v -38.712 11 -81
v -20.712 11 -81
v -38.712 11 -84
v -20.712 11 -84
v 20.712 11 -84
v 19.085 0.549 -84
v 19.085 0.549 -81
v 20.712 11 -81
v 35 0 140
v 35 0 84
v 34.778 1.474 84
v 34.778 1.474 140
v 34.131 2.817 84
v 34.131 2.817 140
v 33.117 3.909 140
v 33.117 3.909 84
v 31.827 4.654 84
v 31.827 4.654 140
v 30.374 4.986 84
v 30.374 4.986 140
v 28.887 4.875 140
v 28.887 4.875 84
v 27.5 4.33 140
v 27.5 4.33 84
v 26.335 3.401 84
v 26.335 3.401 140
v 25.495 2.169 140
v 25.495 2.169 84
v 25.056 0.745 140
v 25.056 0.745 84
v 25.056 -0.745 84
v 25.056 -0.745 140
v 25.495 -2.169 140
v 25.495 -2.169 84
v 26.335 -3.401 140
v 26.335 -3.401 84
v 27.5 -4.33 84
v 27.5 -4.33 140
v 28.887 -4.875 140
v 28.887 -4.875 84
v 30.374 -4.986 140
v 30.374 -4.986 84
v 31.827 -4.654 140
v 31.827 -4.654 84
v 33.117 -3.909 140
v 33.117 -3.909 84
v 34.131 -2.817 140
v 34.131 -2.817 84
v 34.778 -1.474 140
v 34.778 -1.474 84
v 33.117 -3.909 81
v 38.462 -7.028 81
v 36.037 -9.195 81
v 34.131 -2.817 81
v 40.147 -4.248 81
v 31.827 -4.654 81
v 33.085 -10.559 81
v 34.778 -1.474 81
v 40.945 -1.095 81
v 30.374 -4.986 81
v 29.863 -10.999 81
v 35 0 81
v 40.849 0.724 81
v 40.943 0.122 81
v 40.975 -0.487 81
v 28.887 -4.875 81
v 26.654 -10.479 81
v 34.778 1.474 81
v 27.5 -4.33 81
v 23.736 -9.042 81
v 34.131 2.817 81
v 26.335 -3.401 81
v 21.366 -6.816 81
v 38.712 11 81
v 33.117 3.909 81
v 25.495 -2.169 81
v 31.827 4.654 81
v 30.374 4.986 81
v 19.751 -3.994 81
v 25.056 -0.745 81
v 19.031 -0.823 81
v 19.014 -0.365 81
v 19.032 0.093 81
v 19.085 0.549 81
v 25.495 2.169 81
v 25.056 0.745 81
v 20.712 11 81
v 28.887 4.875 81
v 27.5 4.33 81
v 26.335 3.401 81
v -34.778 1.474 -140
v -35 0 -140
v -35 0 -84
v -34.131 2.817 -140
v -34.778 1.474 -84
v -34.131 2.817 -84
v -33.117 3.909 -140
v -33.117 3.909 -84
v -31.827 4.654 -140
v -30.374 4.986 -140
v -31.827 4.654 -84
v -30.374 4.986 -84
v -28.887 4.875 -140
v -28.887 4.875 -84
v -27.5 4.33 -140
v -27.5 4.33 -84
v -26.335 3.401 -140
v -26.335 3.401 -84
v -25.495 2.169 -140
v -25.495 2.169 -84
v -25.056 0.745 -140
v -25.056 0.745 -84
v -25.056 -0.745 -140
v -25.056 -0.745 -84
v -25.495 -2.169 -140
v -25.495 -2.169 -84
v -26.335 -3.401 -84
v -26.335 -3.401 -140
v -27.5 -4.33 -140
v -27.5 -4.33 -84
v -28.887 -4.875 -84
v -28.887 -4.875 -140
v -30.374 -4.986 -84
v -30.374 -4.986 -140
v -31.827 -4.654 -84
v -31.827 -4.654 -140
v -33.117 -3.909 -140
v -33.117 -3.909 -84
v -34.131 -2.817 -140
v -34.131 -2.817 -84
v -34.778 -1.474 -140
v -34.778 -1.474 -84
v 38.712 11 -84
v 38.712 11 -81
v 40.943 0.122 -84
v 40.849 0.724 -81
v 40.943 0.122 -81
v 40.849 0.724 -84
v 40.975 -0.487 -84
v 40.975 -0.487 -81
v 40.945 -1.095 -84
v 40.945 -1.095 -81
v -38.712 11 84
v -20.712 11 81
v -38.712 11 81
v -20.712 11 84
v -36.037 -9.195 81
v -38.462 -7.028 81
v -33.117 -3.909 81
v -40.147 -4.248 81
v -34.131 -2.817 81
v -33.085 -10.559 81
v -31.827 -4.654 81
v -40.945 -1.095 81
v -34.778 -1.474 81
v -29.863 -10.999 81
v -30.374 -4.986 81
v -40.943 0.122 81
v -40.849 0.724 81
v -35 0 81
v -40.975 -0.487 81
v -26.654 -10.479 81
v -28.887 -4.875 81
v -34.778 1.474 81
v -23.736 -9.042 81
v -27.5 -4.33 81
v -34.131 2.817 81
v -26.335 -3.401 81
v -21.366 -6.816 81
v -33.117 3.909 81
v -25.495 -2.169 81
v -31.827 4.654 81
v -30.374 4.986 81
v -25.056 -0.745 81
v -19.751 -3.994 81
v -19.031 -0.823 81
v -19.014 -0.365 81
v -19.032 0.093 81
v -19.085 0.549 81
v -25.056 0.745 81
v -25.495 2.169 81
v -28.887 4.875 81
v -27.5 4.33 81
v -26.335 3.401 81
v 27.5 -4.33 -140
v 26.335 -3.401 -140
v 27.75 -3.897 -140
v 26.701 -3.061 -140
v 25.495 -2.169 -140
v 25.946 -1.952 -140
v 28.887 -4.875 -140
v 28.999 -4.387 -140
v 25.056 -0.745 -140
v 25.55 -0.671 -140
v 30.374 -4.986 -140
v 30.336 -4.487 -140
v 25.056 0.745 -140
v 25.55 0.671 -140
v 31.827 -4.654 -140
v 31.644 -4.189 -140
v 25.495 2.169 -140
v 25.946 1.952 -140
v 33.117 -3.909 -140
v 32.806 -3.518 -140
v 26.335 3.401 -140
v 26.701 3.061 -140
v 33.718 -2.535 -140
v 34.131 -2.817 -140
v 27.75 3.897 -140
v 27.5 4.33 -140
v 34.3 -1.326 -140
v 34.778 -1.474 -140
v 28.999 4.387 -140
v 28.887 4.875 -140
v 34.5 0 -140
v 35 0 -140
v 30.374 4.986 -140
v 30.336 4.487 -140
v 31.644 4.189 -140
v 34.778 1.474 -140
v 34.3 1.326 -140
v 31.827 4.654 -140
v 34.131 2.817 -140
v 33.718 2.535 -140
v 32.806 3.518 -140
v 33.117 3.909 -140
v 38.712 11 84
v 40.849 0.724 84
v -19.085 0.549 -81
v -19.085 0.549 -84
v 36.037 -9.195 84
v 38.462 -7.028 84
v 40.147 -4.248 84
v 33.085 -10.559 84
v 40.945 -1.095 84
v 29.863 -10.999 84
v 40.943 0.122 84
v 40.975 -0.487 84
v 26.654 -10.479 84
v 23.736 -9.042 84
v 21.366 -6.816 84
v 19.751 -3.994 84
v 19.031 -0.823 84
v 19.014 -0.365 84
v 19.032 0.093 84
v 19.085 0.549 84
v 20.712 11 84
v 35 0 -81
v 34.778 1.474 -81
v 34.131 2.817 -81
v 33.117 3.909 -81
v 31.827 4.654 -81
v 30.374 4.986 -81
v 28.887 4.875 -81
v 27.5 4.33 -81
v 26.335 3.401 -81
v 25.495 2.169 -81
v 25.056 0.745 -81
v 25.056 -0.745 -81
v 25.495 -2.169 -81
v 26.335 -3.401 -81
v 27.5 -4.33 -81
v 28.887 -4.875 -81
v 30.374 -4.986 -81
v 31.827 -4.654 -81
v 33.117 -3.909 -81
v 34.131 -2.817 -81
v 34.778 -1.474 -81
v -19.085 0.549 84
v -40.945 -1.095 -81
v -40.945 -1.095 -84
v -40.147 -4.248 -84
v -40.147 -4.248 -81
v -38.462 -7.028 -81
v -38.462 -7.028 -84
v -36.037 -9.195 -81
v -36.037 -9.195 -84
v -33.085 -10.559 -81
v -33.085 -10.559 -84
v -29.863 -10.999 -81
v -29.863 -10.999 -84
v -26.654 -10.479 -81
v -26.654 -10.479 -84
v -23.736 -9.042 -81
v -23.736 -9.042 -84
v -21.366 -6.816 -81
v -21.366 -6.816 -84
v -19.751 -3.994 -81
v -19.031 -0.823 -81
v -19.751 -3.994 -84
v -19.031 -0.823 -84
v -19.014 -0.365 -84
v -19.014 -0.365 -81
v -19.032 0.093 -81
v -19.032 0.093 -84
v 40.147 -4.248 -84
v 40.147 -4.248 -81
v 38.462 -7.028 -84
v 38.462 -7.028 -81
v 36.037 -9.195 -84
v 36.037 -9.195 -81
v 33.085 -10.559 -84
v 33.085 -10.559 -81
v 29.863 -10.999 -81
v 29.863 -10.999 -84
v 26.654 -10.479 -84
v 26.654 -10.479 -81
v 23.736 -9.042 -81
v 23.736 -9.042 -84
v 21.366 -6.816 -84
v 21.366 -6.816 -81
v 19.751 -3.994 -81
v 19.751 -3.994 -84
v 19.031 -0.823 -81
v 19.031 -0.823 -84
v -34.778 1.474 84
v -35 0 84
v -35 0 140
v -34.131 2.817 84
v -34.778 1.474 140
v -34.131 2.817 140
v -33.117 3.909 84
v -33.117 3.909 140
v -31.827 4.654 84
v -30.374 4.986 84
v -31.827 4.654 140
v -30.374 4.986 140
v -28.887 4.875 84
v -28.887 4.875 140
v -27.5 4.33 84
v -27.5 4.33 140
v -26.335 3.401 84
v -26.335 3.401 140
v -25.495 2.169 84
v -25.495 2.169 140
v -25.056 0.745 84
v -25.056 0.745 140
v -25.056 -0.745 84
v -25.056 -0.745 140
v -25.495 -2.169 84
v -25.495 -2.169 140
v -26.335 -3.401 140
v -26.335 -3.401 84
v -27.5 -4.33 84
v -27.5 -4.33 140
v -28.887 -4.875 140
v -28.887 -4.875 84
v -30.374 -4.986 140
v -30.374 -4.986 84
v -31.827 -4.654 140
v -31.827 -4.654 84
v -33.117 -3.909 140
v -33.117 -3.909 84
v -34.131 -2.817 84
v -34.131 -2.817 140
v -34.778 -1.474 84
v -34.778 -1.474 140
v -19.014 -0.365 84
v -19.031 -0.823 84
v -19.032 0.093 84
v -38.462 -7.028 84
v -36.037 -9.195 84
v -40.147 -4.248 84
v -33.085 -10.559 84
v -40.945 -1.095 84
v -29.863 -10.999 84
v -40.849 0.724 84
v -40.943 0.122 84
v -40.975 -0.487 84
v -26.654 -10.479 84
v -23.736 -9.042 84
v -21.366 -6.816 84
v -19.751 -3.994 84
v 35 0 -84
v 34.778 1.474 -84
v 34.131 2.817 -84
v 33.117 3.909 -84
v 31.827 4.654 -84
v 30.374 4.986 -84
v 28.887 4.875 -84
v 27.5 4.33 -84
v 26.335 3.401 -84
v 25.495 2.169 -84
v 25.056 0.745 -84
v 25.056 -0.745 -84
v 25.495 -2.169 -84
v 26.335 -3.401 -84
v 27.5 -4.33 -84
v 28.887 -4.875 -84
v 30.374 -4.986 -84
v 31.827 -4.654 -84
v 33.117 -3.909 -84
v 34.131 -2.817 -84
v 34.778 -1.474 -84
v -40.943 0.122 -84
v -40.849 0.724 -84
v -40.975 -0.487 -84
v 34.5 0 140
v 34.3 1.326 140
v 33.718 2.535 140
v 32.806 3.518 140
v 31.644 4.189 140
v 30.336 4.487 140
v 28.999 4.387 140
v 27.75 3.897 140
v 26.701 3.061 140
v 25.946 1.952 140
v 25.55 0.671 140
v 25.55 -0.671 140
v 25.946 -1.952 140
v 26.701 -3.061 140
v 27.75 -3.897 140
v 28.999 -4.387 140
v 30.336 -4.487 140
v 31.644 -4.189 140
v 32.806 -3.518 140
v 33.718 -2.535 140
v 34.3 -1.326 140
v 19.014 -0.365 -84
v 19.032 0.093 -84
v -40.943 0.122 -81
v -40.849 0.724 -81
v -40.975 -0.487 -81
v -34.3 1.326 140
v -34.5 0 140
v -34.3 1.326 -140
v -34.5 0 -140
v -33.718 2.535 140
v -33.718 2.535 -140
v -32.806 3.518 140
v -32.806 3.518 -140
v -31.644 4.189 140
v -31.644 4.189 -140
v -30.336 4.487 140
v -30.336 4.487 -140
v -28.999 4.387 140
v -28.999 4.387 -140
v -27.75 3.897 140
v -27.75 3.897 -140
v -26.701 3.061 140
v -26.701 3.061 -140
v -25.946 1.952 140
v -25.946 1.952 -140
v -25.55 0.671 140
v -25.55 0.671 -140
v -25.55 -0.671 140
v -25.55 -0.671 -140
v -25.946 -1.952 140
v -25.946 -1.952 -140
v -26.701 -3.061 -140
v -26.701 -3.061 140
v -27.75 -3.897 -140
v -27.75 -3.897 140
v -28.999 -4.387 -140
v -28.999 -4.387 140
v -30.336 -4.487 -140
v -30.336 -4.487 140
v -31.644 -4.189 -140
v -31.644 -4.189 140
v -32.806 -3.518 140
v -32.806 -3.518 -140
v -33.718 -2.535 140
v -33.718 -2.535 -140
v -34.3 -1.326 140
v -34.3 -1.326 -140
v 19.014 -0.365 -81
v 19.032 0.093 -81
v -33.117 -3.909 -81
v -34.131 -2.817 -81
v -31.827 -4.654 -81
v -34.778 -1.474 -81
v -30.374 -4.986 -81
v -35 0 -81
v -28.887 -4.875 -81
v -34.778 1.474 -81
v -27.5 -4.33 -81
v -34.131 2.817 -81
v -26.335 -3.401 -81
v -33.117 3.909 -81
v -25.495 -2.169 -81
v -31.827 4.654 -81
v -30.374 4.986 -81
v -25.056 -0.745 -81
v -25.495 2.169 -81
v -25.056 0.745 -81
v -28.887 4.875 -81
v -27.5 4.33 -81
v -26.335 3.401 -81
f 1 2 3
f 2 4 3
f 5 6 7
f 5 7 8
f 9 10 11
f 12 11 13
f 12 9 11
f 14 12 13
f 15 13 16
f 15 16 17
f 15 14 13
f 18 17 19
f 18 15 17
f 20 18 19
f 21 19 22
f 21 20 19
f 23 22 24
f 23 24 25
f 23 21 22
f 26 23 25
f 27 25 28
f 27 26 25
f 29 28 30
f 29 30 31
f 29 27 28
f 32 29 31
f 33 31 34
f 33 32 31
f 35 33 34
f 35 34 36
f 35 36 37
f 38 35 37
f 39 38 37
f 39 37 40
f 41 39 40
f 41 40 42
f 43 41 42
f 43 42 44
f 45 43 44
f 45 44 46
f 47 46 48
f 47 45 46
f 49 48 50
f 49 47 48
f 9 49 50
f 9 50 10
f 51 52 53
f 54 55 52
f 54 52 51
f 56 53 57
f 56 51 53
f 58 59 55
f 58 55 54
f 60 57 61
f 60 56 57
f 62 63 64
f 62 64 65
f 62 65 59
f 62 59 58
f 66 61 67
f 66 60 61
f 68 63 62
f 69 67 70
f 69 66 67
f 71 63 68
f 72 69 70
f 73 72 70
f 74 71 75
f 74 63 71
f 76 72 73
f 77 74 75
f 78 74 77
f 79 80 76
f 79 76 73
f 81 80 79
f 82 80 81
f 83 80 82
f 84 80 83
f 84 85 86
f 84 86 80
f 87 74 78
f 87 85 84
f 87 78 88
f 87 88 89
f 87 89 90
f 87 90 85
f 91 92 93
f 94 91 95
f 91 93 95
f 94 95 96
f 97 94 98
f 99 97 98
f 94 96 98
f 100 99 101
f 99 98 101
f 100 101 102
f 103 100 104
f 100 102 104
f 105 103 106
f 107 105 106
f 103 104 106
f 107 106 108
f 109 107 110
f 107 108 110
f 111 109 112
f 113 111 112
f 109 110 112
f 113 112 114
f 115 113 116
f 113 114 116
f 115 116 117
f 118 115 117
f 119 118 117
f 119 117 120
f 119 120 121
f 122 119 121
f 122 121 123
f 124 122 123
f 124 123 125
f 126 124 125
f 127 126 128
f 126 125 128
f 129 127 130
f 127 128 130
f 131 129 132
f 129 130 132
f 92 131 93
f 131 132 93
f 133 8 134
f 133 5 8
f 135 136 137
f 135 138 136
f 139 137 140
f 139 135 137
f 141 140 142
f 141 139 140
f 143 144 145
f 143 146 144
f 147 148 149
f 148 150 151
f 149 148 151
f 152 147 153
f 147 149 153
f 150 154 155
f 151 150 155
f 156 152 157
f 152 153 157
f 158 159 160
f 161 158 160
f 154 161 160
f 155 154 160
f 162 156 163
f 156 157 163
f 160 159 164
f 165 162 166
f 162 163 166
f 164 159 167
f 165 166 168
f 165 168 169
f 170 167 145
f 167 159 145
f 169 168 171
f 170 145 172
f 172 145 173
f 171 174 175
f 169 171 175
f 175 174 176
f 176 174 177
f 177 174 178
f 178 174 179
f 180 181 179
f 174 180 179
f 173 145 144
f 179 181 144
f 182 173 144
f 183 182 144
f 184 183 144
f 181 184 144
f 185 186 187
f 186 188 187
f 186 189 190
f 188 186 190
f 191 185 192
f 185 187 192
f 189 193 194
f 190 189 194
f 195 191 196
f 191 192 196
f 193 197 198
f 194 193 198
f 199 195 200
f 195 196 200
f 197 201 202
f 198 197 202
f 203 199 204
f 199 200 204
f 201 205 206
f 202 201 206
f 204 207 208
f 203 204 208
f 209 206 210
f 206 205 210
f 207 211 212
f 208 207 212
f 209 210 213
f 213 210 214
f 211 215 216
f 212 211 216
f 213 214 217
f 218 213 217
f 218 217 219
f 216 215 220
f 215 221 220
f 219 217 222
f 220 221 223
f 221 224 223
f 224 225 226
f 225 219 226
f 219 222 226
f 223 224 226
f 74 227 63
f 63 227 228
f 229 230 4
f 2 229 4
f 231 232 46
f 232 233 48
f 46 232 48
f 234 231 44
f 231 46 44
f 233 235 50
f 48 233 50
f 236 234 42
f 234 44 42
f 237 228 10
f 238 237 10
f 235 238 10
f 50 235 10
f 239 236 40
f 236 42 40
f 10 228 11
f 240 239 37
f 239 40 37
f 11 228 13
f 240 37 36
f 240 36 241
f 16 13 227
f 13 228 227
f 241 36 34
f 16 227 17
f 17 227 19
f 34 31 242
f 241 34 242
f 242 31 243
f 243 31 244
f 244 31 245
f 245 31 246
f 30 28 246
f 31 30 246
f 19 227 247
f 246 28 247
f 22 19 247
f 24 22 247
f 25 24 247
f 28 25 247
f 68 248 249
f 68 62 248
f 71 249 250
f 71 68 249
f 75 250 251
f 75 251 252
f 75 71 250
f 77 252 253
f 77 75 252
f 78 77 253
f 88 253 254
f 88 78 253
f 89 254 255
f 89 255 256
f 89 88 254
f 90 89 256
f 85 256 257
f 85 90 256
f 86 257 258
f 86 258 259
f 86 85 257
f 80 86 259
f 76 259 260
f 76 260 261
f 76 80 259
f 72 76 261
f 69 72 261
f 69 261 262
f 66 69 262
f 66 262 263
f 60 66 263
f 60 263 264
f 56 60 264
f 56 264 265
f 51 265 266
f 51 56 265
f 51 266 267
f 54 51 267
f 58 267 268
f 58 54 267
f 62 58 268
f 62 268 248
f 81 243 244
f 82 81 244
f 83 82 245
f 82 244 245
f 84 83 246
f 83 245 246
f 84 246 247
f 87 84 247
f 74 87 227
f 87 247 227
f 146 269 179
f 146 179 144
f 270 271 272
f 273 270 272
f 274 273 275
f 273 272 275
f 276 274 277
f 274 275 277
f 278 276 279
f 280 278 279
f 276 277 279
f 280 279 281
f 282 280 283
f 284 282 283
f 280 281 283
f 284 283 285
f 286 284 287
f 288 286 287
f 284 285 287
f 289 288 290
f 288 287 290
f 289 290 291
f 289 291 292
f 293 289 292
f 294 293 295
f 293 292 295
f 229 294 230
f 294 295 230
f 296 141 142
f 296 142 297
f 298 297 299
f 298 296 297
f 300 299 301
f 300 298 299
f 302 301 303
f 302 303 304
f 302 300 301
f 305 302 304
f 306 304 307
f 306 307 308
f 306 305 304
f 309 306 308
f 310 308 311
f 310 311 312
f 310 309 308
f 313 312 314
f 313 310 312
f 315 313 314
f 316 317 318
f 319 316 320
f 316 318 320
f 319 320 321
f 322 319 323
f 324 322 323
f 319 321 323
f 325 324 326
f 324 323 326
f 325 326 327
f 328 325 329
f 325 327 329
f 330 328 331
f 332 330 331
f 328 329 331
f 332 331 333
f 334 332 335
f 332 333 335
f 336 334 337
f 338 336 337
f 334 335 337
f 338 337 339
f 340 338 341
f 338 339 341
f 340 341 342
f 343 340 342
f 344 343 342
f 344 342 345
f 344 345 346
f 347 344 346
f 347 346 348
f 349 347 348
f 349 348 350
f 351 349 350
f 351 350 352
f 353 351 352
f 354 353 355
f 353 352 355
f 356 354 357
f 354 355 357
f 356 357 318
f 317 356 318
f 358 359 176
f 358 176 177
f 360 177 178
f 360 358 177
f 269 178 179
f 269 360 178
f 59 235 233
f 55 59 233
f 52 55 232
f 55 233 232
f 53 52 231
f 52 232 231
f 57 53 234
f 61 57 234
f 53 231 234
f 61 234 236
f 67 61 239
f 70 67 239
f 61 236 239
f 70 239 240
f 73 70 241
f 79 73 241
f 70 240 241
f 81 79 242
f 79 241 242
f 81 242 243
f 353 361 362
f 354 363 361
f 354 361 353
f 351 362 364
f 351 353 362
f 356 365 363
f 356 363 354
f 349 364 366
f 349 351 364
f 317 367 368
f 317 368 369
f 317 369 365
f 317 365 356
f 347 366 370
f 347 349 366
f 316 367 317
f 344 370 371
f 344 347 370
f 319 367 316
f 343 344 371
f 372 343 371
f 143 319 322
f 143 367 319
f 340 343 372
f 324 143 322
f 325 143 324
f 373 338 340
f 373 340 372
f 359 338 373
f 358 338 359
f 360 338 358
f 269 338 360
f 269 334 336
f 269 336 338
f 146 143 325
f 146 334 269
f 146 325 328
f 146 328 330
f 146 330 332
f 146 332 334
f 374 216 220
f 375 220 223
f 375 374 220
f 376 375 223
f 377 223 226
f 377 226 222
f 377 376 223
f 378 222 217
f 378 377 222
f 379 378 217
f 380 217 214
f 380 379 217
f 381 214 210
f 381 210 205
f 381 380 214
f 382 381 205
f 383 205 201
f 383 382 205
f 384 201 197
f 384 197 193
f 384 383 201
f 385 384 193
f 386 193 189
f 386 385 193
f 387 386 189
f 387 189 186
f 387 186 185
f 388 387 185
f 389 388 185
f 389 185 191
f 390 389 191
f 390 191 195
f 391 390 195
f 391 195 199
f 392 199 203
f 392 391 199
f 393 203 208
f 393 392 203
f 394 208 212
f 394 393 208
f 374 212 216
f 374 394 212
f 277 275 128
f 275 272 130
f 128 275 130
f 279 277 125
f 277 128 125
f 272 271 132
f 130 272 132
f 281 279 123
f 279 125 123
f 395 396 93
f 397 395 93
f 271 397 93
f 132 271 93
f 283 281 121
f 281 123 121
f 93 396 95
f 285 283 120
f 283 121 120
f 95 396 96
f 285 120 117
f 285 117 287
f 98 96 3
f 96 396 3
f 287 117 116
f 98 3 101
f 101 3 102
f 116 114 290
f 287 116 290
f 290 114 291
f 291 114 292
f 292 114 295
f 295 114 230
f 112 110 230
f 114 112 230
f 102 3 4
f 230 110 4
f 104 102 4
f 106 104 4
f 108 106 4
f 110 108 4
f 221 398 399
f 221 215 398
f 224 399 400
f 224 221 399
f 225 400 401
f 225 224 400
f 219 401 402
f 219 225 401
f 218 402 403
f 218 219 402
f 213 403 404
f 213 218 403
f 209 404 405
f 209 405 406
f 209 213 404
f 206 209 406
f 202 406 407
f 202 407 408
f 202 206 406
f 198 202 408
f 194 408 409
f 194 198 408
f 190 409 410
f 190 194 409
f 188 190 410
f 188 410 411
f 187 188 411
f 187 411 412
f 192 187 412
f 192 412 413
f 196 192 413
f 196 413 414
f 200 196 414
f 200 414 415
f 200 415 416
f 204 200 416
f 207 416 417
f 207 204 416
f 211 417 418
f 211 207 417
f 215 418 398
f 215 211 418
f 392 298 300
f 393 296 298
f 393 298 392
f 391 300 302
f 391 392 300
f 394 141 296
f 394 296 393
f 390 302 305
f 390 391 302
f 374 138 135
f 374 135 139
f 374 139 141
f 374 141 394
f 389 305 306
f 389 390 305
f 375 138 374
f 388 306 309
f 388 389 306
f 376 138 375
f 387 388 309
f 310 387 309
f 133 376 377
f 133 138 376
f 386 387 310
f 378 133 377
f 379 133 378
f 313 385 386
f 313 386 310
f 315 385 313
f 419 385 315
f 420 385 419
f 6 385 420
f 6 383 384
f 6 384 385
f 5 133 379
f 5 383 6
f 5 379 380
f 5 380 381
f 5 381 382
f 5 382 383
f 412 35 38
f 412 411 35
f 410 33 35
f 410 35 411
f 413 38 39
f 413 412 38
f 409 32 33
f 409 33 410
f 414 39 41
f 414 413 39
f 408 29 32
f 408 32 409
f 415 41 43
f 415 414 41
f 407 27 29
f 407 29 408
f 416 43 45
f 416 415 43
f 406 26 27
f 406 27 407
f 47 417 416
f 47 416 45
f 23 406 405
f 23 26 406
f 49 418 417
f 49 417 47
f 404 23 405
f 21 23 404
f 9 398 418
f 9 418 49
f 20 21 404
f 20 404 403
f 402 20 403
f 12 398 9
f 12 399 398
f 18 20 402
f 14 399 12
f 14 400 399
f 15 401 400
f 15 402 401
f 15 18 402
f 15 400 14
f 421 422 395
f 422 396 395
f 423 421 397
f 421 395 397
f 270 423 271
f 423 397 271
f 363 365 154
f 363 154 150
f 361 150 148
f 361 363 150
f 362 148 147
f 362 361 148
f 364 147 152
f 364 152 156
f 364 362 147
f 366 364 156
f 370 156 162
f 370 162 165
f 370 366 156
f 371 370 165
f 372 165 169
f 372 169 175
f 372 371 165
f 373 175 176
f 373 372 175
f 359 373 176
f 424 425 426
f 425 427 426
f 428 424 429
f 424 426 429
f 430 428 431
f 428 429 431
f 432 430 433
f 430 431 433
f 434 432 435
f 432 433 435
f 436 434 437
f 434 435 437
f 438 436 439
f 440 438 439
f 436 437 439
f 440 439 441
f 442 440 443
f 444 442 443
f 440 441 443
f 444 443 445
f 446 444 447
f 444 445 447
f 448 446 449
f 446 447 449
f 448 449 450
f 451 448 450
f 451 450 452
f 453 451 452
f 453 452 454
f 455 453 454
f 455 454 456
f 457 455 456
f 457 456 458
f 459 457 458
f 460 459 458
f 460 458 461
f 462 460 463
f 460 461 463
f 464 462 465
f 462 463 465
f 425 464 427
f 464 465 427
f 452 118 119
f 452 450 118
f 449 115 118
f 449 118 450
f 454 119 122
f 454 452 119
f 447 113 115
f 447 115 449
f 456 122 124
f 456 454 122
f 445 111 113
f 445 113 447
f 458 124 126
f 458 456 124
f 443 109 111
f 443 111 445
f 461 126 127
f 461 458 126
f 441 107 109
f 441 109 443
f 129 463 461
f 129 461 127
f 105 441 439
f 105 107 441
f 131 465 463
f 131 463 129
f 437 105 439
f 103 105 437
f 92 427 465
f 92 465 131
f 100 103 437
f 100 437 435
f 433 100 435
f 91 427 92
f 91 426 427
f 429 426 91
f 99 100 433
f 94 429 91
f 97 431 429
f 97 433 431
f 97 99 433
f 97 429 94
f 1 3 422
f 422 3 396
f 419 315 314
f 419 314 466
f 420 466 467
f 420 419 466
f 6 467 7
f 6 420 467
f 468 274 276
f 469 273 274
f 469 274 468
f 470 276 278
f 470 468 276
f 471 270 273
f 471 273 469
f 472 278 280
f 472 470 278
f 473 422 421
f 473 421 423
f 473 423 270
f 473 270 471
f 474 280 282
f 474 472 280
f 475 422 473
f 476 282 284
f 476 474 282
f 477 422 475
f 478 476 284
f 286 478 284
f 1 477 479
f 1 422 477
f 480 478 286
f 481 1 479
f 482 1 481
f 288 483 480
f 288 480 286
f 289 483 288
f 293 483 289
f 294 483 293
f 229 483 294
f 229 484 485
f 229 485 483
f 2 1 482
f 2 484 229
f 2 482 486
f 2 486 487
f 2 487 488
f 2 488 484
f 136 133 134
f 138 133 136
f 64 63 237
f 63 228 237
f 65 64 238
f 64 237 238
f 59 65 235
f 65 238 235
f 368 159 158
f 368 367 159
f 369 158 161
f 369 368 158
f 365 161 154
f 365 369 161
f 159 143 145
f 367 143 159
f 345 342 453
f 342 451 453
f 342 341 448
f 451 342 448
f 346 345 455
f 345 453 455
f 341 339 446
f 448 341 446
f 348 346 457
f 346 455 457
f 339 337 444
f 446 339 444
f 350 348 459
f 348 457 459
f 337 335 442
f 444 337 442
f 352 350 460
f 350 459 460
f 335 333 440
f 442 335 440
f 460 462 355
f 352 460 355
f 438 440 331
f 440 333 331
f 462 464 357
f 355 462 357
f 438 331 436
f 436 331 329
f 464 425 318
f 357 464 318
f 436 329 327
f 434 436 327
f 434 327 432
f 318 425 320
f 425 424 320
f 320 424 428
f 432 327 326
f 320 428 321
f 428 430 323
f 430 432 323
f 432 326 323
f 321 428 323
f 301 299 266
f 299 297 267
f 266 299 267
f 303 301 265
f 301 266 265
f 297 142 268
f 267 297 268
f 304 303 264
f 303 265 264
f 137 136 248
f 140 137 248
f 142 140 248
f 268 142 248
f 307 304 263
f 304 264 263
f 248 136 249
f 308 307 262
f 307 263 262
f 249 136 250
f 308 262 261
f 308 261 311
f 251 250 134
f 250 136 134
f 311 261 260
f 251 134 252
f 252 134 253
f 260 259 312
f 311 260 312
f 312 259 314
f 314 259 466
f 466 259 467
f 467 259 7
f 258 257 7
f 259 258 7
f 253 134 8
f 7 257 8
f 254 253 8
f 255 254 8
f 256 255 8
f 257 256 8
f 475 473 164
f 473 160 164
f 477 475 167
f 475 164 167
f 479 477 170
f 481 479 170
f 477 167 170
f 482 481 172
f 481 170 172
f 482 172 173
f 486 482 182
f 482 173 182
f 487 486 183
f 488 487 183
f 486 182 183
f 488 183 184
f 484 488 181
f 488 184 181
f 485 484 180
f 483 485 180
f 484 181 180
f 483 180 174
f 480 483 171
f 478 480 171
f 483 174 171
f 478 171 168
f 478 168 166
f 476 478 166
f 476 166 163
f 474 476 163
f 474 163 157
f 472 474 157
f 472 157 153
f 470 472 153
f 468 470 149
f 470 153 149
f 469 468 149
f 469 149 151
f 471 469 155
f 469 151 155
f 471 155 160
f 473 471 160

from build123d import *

# Parameters (mm, degrees)
SCHIZZO1_R                   = 5
SCHIZZO1_R_2                 = 4.5
ESTRUSIONE_ESTRUSIONE1_DEPTH = 140
ESTRUSIONE_ESTRUSIONE2_START = 82.5
SCHIZZO2_R                   = 5
ESTRUSIONE_ESTRUSIONE2_DEPTH = 1.5


with BuildPart() as part:
    # Schizzo1 → Estrusione-Estrusione1 (new body, symmetric)
    with BuildSketch(Plane.XY):
        with Locations((30, 0)):
            Circle(SCHIZZO1_R)
        with Locations((30, 0)):
            Circle(SCHIZZO1_R_2, mode=Mode.SUBTRACT)
    extrude(amount=ESTRUSIONE_ESTRUSIONE1_DEPTH, both=True)

    # Schizzo2 → Estrusione-Estrusione2 (add, symmetric)
    with BuildSketch(Plane.XY.offset(ESTRUSIONE_ESTRUSIONE2_START)):
        with BuildLine():
            Line((19.085389697, 0.548640093), (20.712027021, 11))
            Line((20.712027021, 11), (38.712027021, 11))
            Line((38.712027021, 11), (40.849423677, 0.72393318))
            ThreePointArc((40.849423677, 0.72393318), (40.966829068, -0.18206425), (40.945324752, -1.095383983))
            ThreePointArc((40.945324752, -1.095383983), (29.863279468, -10.999150308), (19.030829735, -0.822984631))
            ThreePointArc((19.030829735, -0.822984631), (19.018754667, -0.135606819), (19.085389697, 0.548640093))
        make_face()
        with Locations((30, 0)):
            Circle(SCHIZZO2_R, mode=Mode.SUBTRACT)
    extrude(amount=ESTRUSIONE_ESTRUSIONE2_DEPTH, both=True)

    # Specchia5: part across plane


with BuildPart() as part_1:
    add(part.part)
    add(part.part.mirror(Plane.XY))


with BuildPart() as body_2:
    # Specchia9: mirrored copy
    add(part_1.part.mirror(Plane(origin=(0, 0, 0), x_dir=(0, 0, 1), z_dir=(1, 0, 0))))


solid = Compound([part_1.part, body_2.part])
